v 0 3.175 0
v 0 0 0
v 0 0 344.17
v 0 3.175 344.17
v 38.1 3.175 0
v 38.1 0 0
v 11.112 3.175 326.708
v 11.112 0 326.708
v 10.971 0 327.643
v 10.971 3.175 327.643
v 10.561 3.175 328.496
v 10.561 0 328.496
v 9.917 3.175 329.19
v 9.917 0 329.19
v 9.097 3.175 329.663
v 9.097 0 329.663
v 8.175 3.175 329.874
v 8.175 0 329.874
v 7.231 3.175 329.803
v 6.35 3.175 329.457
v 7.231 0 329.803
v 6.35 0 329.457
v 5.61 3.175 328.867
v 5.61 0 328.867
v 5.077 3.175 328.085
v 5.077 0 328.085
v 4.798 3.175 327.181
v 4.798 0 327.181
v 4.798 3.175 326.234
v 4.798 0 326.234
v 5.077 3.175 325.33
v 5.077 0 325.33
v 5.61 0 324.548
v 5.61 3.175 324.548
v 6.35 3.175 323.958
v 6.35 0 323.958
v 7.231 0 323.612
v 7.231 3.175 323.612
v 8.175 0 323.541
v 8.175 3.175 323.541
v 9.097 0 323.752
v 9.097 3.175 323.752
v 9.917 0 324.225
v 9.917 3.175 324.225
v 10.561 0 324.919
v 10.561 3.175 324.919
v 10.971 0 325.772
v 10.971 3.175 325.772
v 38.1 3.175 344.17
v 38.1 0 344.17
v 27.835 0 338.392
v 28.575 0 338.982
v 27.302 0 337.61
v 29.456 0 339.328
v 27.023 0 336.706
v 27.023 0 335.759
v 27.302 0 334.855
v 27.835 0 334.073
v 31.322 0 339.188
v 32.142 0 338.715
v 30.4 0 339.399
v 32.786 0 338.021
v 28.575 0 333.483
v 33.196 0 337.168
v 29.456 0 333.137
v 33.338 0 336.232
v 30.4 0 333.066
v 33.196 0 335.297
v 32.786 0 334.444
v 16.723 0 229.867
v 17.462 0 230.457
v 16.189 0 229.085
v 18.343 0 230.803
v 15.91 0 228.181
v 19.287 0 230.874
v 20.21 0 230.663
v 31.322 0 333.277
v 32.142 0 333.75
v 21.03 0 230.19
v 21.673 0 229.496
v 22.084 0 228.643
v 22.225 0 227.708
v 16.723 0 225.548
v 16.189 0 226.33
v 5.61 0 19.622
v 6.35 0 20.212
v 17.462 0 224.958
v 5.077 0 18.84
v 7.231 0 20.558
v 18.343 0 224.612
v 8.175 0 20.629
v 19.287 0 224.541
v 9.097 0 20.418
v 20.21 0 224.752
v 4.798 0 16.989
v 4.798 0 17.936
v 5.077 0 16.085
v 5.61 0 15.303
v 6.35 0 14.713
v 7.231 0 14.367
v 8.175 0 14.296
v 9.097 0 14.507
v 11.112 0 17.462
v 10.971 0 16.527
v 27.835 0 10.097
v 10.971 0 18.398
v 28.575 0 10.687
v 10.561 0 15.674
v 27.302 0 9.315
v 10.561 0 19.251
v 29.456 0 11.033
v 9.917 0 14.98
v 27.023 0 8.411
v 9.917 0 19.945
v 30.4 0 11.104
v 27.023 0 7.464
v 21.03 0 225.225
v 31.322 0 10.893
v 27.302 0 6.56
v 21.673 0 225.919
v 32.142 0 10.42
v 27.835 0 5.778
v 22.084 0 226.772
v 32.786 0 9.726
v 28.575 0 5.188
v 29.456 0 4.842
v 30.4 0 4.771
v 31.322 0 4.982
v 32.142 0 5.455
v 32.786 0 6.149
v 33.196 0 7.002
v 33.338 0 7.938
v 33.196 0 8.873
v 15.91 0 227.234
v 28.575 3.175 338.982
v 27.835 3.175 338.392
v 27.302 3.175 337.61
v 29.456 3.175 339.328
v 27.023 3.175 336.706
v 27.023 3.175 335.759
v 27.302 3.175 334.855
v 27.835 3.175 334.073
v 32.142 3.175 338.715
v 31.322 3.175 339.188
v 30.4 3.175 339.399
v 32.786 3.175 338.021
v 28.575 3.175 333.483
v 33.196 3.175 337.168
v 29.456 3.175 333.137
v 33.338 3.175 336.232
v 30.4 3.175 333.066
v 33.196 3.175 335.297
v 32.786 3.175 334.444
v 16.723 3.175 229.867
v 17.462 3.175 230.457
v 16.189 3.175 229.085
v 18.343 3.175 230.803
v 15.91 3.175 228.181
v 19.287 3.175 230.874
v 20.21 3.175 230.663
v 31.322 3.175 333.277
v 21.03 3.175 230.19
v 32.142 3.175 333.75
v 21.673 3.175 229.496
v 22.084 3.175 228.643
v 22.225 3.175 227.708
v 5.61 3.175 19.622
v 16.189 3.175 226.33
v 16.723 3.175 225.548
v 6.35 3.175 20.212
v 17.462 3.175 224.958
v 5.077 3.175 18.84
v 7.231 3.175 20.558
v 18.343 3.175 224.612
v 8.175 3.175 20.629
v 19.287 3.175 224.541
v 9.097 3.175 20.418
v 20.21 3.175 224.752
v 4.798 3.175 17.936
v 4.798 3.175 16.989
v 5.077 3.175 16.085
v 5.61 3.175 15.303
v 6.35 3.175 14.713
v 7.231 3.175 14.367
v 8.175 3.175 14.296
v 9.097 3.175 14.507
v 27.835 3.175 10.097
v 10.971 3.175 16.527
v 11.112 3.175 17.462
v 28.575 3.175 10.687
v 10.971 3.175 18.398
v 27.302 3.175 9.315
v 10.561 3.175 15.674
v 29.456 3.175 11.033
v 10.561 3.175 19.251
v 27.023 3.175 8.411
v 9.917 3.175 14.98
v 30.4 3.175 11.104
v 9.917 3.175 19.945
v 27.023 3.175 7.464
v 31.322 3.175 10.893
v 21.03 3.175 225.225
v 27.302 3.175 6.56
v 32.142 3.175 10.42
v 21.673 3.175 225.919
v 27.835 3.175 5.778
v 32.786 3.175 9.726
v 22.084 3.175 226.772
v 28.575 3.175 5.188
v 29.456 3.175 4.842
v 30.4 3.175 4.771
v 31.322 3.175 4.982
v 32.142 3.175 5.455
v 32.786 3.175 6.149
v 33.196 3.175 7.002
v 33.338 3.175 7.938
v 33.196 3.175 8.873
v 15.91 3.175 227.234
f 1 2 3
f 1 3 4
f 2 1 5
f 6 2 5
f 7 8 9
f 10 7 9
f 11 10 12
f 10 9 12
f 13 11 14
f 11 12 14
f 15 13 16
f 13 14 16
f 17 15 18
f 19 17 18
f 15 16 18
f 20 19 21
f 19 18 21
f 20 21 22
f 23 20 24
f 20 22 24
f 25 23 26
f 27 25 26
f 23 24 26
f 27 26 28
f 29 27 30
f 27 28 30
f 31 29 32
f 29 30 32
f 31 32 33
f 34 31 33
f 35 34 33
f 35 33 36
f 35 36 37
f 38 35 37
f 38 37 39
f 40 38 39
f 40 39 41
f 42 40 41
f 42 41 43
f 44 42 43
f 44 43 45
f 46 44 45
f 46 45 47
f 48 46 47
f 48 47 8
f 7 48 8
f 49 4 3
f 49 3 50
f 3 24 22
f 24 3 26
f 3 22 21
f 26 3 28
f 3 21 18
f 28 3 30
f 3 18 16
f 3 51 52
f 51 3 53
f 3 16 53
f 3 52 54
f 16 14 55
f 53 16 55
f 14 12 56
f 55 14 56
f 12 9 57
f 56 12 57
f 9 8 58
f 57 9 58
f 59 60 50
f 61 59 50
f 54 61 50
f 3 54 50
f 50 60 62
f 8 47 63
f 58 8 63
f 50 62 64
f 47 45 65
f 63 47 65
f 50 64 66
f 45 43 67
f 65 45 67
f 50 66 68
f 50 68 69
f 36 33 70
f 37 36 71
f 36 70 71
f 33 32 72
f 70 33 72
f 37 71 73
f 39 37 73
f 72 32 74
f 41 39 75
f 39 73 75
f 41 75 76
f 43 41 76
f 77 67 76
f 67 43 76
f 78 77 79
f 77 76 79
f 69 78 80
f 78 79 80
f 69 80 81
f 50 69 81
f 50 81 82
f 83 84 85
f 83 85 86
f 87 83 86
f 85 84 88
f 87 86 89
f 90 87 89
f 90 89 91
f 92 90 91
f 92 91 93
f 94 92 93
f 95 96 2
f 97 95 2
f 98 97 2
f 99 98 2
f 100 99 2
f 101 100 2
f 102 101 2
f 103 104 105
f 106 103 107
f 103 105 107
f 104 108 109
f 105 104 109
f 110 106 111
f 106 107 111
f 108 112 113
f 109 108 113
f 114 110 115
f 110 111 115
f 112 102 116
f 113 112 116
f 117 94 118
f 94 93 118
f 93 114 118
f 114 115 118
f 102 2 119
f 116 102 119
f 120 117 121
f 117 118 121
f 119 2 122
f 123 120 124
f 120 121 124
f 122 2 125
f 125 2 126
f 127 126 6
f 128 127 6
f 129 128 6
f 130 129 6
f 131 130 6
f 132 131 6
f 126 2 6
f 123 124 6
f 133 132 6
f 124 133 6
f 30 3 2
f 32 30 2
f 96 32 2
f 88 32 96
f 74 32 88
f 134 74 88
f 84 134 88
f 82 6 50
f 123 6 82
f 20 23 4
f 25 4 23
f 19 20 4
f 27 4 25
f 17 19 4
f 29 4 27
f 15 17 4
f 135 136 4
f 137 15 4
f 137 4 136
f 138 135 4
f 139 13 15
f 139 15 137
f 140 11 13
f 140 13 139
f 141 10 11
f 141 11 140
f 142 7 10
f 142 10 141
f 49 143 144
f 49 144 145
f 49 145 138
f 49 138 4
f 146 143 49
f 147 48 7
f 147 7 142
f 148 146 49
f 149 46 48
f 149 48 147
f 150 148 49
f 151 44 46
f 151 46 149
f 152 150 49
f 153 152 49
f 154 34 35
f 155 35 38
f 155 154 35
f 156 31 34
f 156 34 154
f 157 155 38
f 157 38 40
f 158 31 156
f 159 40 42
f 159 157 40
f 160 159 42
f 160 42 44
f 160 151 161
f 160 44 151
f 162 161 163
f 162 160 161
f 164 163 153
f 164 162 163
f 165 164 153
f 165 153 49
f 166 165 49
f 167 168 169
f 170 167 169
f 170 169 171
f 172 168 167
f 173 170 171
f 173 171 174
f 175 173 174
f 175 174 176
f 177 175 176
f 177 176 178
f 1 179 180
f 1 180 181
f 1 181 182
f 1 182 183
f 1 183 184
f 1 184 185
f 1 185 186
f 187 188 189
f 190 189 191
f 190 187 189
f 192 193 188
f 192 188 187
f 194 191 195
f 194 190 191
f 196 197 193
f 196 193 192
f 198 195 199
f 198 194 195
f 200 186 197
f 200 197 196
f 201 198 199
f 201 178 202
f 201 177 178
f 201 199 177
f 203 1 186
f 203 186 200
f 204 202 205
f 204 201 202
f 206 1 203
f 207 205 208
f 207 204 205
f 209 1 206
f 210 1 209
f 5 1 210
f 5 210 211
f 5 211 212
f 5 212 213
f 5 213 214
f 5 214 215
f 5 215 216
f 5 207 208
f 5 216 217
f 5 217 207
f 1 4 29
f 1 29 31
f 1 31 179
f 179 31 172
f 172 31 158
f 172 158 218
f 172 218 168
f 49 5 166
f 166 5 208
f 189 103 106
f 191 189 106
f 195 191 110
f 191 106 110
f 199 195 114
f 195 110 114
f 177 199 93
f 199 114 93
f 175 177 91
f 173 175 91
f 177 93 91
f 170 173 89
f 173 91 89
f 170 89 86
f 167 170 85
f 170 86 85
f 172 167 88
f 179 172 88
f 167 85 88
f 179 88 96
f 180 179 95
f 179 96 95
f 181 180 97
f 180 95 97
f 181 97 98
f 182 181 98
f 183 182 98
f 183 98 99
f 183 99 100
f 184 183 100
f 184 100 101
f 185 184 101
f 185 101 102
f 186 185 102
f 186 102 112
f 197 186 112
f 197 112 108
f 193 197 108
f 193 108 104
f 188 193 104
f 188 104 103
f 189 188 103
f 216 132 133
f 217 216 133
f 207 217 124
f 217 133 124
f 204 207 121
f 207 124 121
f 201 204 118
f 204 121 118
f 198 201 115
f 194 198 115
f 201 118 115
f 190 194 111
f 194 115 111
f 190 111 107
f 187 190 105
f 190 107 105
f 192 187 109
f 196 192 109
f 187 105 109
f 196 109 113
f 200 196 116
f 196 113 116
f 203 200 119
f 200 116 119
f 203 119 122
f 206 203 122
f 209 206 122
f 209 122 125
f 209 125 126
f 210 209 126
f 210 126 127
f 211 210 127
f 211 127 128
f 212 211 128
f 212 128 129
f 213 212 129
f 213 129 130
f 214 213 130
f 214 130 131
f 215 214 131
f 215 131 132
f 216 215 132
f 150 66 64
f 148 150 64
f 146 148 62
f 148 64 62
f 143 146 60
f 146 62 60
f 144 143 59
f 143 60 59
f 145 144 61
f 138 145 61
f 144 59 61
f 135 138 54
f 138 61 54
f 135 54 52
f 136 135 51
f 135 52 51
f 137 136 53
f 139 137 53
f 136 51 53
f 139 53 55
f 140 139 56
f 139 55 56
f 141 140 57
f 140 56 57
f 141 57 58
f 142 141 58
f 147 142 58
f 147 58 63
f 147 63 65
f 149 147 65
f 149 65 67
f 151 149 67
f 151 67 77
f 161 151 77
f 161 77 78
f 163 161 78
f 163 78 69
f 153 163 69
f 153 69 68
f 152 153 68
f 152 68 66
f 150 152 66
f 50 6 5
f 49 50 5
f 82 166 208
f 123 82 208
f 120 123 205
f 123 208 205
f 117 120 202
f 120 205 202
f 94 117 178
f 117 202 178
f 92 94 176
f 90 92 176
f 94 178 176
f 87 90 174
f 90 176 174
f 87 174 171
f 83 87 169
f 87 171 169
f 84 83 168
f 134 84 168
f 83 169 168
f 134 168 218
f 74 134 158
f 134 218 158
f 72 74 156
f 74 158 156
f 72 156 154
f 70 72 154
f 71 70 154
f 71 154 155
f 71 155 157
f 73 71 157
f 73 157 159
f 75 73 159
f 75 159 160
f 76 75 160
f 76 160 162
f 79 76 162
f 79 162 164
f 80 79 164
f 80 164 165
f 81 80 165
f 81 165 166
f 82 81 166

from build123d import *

# Parameters (mm, degrees)
SKETCH1_W               = 38.1
SKETCH1_H               = 3.175
BOSS_EXTRUDE1_DEPTH     = 344.17
SKETCH3_R               = 3.175
CUT_EXTRUDE1_DEPTH      = 4.175
SKETCH4_R               = 3.175
CUT_EXTRUDE2_DEPTH      = 1
CUT_EXTRUDE2_DEPTH_BACK = 4.175


with BuildPart() as part:
    # Sketch1 → Boss-Extrude1 (new body)
    with BuildSketch(Plane.XY):
        with Locations((19.05, 1.5875)):
            Rectangle(SKETCH1_W, SKETCH1_H)
    extrude(amount=BOSS_EXTRUDE1_DEPTH)

    # Sketch3 → Cut-Extrude1 (cut, through all)
    with BuildSketch(Plane(origin=(0, 3.175, 0), x_dir=(1, 0, 0), z_dir=(0, 1, 0))):
        with Locations((19.05, -227.7075202)):
            Circle(SKETCH3_R)
    extrude(amount=-CUT_EXTRUDE1_DEPTH, mode=Mode.SUBTRACT)

    # Sketch4 → Cut-Extrude2 (cut, two sides)
    with BuildSketch(Plane.XZ) as cut_extrude2_sk:
        with Locations((30.1625, 336.2325)):
            Circle(SKETCH4_R)
        with Locations((7.9375, 326.7075)):
            Circle(SKETCH4_R)
        with Locations((7.9375, 17.4625)):
            Circle(SKETCH4_R)
        with Locations((30.1625, 7.9375)):
            Circle(SKETCH4_R)
    extrude(amount=CUT_EXTRUDE2_DEPTH, mode=Mode.SUBTRACT)
    extrude(cut_extrude2_sk.sketch, amount=-CUT_EXTRUDE2_DEPTH_BACK, mode=Mode.SUBTRACT)


solid = part.part
